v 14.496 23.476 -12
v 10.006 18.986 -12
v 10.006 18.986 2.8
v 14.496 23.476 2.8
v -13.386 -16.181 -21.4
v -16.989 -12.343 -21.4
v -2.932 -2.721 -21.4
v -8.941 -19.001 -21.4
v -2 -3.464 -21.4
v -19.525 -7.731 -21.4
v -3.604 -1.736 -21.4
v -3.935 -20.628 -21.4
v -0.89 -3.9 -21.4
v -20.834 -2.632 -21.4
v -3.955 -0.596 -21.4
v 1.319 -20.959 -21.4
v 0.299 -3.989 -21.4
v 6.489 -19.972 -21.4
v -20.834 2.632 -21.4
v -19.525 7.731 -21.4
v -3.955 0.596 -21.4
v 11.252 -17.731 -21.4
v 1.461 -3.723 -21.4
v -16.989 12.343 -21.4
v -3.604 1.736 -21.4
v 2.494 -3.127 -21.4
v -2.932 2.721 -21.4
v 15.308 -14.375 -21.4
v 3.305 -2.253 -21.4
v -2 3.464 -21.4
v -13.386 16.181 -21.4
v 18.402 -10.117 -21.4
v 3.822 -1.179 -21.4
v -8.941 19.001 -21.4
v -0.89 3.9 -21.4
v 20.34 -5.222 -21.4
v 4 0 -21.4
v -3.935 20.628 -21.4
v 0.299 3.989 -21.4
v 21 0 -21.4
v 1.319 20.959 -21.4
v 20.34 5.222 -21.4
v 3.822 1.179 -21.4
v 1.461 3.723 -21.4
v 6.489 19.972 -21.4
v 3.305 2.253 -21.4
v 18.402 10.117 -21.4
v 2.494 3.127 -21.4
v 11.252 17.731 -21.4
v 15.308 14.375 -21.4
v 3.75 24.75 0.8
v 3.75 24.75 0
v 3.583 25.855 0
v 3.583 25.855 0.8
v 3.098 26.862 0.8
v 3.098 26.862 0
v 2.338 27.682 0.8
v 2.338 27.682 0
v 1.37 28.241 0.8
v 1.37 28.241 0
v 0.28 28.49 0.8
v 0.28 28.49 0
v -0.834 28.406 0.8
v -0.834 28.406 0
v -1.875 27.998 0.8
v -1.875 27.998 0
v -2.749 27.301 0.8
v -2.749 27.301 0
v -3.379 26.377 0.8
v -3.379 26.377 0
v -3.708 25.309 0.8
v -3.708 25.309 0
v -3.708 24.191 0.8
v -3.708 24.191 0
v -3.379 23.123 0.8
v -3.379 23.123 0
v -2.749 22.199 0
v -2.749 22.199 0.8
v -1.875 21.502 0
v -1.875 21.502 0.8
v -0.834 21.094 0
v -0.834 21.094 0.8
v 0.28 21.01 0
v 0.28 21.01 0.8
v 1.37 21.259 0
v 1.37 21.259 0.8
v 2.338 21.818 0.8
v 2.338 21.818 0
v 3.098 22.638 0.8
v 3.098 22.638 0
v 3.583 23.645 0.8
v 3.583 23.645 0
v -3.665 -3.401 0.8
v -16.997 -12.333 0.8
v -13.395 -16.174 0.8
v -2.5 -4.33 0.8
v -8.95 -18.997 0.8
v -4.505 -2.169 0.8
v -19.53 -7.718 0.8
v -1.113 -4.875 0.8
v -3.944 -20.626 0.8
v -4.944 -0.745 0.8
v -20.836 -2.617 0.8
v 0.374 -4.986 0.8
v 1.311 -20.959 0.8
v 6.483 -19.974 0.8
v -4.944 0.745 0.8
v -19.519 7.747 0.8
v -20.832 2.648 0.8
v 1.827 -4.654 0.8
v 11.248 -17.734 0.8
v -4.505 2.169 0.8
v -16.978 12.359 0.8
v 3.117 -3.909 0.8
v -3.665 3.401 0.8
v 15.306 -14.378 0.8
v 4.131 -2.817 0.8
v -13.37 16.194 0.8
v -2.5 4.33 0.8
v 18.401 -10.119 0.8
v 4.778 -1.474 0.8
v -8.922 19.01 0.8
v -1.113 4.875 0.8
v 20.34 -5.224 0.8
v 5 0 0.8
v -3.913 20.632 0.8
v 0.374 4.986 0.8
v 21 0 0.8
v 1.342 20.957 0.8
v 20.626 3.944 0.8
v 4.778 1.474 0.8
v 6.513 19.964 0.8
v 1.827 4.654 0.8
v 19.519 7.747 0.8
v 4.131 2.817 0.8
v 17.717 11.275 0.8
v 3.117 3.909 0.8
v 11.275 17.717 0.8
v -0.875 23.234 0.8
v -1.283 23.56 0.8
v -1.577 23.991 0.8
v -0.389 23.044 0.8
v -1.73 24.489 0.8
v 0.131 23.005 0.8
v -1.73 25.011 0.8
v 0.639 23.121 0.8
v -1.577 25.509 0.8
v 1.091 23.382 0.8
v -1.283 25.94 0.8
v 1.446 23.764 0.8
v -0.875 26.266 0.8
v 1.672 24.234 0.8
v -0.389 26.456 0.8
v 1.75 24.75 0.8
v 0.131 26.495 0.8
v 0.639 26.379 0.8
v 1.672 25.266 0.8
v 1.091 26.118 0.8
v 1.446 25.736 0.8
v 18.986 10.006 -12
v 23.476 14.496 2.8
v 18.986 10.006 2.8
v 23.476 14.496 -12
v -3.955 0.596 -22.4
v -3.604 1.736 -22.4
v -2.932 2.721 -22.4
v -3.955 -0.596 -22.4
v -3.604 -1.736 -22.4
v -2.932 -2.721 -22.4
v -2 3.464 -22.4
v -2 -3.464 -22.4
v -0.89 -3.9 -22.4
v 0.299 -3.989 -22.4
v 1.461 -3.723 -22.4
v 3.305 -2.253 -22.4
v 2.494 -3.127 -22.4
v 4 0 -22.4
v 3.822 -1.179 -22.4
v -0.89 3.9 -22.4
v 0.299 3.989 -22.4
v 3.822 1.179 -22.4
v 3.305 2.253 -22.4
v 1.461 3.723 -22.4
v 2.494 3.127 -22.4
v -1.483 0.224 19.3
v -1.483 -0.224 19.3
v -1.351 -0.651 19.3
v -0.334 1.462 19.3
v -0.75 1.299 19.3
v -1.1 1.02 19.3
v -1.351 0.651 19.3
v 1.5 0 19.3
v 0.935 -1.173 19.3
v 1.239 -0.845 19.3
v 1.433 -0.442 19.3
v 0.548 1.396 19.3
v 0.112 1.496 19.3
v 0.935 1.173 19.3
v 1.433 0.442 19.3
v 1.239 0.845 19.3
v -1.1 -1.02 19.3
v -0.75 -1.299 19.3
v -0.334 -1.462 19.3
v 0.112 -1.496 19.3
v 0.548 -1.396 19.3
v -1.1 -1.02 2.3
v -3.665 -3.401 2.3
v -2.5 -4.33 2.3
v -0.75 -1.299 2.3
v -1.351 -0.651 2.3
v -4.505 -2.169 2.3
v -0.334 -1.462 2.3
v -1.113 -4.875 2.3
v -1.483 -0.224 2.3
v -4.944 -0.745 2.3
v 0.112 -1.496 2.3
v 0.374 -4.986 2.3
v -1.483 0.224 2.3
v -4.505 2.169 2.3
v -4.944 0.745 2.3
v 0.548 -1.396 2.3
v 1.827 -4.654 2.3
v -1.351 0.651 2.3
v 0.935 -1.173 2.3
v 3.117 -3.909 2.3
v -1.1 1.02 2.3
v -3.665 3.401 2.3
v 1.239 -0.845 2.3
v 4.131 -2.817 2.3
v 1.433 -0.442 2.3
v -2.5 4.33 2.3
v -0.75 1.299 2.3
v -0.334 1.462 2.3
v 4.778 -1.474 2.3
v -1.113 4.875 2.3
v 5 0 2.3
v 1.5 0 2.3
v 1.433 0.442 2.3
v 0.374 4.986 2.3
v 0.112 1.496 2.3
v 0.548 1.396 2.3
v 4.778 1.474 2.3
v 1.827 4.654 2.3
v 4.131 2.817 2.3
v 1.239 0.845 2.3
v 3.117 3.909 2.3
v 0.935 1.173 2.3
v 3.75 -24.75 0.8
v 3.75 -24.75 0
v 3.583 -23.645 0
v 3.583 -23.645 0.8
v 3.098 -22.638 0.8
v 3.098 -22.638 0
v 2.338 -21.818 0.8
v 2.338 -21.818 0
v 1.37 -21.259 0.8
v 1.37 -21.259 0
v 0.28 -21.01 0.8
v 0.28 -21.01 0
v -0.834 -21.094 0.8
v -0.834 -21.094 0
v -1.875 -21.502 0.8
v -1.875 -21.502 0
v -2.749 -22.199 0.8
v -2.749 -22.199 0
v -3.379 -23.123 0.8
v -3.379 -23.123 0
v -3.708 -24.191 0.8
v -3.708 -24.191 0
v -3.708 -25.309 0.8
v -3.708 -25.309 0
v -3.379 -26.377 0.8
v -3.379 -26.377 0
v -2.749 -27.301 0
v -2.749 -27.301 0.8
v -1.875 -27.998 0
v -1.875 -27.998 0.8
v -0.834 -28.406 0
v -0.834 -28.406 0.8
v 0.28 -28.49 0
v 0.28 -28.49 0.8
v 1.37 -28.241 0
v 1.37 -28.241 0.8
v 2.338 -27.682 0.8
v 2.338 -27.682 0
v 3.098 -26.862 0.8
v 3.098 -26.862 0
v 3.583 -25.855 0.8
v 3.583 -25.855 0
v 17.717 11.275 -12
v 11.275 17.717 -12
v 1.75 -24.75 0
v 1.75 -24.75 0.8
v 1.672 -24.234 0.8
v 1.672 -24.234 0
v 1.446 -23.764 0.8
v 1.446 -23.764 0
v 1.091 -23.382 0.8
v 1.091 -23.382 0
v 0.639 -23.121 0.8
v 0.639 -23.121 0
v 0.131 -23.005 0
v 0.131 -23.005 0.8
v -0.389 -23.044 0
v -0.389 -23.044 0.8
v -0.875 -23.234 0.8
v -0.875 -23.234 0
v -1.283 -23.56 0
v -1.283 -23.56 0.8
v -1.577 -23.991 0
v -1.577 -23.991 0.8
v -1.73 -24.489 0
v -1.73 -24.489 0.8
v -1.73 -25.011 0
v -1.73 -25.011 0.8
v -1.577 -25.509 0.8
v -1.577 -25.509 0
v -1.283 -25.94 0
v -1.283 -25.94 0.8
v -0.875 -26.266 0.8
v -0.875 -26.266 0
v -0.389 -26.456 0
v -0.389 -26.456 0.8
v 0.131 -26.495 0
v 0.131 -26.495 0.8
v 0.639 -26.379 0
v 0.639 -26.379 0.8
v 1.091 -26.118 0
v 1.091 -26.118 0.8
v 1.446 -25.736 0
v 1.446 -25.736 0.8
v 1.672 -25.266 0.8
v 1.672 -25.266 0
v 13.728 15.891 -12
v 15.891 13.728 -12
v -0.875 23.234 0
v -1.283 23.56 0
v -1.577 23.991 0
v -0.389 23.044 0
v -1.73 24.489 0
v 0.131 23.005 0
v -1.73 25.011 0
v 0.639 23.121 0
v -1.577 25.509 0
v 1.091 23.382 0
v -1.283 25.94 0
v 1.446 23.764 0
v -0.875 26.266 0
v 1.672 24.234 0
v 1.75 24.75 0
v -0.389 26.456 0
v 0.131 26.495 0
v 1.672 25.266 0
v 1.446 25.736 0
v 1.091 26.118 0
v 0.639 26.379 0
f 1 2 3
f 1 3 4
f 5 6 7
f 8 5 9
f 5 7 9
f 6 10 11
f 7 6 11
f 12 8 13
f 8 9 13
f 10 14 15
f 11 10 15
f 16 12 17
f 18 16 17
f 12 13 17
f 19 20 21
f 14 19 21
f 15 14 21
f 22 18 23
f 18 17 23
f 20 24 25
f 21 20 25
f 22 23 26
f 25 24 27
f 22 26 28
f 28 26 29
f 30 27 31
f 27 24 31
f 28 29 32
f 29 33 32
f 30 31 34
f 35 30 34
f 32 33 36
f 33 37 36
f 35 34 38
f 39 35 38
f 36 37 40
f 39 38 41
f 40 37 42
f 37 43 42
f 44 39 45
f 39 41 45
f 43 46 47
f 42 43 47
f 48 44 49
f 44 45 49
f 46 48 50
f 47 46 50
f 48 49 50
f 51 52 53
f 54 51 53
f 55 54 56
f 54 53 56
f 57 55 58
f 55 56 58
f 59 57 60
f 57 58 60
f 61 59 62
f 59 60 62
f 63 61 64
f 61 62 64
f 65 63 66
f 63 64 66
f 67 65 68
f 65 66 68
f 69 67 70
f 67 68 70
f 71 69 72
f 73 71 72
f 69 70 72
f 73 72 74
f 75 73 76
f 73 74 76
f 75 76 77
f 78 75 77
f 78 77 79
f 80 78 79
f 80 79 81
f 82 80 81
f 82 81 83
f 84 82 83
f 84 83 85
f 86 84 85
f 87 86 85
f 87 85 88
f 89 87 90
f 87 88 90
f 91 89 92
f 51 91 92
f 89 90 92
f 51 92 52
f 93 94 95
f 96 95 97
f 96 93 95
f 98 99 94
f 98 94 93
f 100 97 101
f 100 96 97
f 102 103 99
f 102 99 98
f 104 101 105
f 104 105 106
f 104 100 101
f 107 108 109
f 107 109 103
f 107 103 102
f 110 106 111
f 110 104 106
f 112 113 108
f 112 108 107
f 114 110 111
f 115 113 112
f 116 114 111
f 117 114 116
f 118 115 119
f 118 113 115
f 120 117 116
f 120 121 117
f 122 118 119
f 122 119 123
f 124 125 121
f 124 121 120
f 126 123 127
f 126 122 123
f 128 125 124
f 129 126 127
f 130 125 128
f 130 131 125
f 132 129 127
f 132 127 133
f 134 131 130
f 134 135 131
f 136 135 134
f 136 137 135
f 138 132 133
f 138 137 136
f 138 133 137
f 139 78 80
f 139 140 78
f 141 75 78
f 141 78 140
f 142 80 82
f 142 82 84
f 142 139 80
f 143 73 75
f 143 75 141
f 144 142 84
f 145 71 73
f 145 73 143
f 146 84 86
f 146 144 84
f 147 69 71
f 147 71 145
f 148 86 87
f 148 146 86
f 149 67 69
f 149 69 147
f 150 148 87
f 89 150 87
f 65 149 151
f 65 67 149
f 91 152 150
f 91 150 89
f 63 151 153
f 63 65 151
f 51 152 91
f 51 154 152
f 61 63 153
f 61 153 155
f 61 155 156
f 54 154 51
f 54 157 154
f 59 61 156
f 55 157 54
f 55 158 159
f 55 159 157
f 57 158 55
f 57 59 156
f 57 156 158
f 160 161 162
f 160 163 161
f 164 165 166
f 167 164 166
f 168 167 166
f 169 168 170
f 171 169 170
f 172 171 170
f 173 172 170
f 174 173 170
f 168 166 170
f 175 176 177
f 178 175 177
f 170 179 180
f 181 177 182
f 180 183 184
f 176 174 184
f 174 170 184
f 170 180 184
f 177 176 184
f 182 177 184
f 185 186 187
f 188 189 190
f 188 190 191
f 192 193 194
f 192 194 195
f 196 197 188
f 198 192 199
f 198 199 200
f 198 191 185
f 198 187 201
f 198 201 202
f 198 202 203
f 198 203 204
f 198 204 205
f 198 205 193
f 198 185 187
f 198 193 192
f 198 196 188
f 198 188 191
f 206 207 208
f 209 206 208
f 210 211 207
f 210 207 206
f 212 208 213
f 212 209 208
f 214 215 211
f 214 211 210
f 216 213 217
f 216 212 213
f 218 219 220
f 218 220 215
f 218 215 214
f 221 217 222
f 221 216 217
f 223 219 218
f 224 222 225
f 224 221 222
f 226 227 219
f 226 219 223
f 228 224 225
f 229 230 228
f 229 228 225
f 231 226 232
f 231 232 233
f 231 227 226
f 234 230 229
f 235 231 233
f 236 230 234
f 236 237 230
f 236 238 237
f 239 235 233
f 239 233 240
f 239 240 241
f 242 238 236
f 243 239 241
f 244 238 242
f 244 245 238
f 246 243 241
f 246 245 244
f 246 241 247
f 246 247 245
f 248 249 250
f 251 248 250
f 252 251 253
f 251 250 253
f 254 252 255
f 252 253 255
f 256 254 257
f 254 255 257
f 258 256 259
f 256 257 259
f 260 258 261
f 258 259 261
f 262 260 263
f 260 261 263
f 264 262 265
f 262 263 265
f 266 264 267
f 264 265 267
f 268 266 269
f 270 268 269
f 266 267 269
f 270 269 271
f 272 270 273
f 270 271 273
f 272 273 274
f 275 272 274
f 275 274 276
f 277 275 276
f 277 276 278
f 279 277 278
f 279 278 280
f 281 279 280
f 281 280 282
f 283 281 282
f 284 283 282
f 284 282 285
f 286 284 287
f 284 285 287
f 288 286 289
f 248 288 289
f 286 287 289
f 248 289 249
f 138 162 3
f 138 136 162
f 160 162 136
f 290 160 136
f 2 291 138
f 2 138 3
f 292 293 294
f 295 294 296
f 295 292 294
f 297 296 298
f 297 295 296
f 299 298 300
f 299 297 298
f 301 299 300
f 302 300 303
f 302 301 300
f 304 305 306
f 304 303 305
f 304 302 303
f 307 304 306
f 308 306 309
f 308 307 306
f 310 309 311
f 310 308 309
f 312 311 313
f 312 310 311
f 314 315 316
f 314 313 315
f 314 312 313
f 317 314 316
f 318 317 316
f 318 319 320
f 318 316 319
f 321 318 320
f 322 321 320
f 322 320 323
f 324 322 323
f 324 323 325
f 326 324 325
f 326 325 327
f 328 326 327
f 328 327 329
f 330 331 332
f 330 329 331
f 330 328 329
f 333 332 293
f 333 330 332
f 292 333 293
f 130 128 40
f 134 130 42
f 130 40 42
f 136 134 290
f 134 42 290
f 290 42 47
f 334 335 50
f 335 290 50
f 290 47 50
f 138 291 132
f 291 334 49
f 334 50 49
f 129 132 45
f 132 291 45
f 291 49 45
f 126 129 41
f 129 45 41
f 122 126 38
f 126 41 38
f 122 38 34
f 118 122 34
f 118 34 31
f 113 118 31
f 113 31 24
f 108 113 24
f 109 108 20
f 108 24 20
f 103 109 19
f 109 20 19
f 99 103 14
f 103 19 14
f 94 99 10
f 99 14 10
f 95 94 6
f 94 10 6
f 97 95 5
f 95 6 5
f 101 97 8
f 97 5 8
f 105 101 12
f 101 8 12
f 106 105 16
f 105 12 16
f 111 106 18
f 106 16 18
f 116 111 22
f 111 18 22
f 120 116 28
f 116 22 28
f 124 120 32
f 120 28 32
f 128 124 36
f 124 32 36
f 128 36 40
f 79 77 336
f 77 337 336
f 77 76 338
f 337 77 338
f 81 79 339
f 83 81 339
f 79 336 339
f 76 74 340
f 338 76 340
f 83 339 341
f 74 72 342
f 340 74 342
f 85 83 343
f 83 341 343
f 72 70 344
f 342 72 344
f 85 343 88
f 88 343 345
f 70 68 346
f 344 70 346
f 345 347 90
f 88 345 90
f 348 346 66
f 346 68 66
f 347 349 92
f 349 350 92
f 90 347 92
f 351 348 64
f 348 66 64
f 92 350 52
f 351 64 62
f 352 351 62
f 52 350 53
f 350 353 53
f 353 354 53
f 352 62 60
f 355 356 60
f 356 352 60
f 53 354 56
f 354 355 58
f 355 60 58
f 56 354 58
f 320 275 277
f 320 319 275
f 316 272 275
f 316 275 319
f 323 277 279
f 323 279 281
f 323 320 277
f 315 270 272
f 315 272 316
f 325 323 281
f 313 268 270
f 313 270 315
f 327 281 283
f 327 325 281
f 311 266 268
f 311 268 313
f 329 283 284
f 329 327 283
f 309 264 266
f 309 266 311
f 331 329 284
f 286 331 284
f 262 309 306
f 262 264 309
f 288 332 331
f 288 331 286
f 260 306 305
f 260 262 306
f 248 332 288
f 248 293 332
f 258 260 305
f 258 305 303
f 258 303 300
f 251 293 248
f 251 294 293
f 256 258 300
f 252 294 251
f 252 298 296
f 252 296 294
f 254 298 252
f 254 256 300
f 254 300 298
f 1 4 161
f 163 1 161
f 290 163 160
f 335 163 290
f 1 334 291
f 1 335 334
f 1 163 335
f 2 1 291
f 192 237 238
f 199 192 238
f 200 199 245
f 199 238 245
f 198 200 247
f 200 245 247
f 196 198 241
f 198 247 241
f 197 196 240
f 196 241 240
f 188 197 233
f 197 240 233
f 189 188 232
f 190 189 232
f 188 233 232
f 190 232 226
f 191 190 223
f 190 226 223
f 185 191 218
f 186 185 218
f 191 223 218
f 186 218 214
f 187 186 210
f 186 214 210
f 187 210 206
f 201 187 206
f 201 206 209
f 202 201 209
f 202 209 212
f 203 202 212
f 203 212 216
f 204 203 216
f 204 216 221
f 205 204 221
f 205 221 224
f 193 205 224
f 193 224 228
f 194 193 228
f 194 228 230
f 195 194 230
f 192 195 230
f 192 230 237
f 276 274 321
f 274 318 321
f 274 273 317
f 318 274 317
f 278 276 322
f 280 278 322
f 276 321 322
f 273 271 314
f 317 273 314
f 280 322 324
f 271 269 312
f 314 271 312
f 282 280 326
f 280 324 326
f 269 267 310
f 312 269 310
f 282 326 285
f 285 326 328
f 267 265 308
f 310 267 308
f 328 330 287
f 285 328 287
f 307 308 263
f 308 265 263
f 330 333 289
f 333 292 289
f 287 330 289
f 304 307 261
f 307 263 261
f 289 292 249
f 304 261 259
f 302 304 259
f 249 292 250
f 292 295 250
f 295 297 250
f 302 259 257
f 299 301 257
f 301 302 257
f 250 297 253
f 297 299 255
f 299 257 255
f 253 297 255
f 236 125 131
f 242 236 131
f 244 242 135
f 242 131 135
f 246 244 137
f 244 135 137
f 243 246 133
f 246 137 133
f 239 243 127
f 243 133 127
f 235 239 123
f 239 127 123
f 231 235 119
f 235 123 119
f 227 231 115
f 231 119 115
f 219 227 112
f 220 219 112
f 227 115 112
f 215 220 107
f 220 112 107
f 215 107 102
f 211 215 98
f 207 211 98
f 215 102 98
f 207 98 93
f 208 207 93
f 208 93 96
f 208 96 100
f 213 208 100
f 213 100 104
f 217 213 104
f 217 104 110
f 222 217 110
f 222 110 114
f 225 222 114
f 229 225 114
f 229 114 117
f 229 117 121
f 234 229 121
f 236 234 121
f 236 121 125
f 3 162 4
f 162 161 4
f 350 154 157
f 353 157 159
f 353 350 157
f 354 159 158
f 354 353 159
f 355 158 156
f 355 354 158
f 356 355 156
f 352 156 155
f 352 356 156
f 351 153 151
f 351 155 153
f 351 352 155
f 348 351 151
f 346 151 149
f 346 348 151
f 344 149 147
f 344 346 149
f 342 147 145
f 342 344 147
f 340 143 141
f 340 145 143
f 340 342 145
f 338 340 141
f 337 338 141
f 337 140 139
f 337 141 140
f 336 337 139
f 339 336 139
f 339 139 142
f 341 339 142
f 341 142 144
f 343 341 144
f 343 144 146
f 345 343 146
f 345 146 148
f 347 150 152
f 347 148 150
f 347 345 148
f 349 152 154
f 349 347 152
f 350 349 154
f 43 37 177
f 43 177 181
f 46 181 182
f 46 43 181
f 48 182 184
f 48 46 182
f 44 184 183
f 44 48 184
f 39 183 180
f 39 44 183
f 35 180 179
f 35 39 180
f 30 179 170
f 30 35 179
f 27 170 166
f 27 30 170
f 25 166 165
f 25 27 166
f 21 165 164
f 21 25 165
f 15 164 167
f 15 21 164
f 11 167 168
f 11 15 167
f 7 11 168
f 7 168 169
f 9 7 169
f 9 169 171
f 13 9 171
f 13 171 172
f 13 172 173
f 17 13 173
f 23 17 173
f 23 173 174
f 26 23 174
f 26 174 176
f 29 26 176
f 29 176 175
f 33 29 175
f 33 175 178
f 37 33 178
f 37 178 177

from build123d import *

# Parameters (mm, degrees)
SKETCH1_R           = 21
BOSS_EXTRUDE1_DEPTH = 0.8
SKETCH2_R           = 3.75
BOSS_EXTRUDE2_DEPTH = 0.8
SKETCH3_R           = 3.75
BOSS_EXTRUDE3_DEPTH = 0.8
SKETCH4_R           = 1.75
CUT_EXTRUDE2_DEPTH  = 1.8
BOSS_EXTRUDE4_START = -21.4
SKETCH5_R           = 21
BOSS_EXTRUDE4_DEPTH = 21.4
SKETCH6_R           = 4
BOSS_EXTRUDE5_DEPTH = 22.4
SKETCH7_R           = 5
BOSS_EXTRUDE6_DEPTH = 2.3
SKETCH8_R           = 1.5
BOSS_EXTRUDE7_DEPTH = 19.3
BOSS_EXTRUDE8_DEPTH = 12
BOSS_EXTRUDE9_DEPTH = 2.8


with BuildPart() as part:
    # Sketch1 → Boss-Extrude1 (new body)
    with BuildSketch(Plane.XY):
        Circle(SKETCH1_R)
    extrude(amount=BOSS_EXTRUDE1_DEPTH)

    # Sketch5 → Boss-Extrude4 (add)
    with BuildSketch(Plane.XY.offset(BOSS_EXTRUDE4_START)):
        Circle(SKETCH5_R)
    extrude(amount=BOSS_EXTRUDE4_DEPTH)

    # Sketch6 → Boss-Extrude5 (add)
    with BuildSketch(Plane.XY):
        Circle(SKETCH6_R)
    extrude(amount=-BOSS_EXTRUDE5_DEPTH)

    # Sketch7 → Boss-Extrude6 (add)
    with BuildSketch(Plane.XY):
        Circle(SKETCH7_R)
    extrude(amount=BOSS_EXTRUDE6_DEPTH)

    # Sketch8 → Boss-Extrude7 (add)
    with BuildSketch(Plane.XY):
        Circle(SKETCH8_R)
    extrude(amount=BOSS_EXTRUDE7_DEPTH)

    # Sketch9 → Boss-Extrude8 (add)
    with BuildSketch(Plane.XY):
        Polygon((18.985817075, 10.005560954), (10.005560954, 18.985817075), (14.495689014, 23.475945135), (23.475945135, 14.495689014), align=None)
    extrude(amount=-BOSS_EXTRUDE8_DEPTH)

    # Sketch10 → Boss-Extrude9 (add)
    with BuildSketch(Plane.XY):
        Polygon((18.985817075, 10.005560954), (10.005560954, 18.985817075), (14.495689014, 23.475945135), (23.475945135, 14.495689014), align=None)
    extrude(amount=BOSS_EXTRUDE9_DEPTH)


with BuildPart() as body_2:
    # Sketch2 → Boss-Extrude2 (new body)
    with BuildSketch(Plane.XY):
        with Locations((0, 24.75)):
            Circle(SKETCH2_R)
    extrude(amount=BOSS_EXTRUDE2_DEPTH)


with BuildPart() as body_3:
    # Sketch3 → Boss-Extrude3 (new body)
    with BuildSketch(Plane.XY):
        with Locations((0, -24.75)):
            Circle(SKETCH3_R)
    extrude(amount=BOSS_EXTRUDE3_DEPTH)


with BuildPart() as cut_extrude2_tool:
    # Sketch4 → Cut-Extrude2 (new body)
    with BuildSketch(Plane.XY):
        with Locations((0, 24.75)):
            Circle(SKETCH4_R)
        with Locations((0, -24.75)):
            Circle(SKETCH4_R)
    extrude(amount=CUT_EXTRUDE2_DEPTH)


with BuildPart() as body_2_1:
    add(body_2.part)

    # Cut-Extrude2: cut by cut_extrude2_tool
    add(cut_extrude2_tool.part, mode=Mode.SUBTRACT)


with BuildPart() as body_3_1:
    add(body_3.part)

    # Cut-Extrude2: cut by cut_extrude2_tool
    add(cut_extrude2_tool.part, mode=Mode.SUBTRACT)


solid = Compound([part.part, body_2_1.part, body_3_1.part])
